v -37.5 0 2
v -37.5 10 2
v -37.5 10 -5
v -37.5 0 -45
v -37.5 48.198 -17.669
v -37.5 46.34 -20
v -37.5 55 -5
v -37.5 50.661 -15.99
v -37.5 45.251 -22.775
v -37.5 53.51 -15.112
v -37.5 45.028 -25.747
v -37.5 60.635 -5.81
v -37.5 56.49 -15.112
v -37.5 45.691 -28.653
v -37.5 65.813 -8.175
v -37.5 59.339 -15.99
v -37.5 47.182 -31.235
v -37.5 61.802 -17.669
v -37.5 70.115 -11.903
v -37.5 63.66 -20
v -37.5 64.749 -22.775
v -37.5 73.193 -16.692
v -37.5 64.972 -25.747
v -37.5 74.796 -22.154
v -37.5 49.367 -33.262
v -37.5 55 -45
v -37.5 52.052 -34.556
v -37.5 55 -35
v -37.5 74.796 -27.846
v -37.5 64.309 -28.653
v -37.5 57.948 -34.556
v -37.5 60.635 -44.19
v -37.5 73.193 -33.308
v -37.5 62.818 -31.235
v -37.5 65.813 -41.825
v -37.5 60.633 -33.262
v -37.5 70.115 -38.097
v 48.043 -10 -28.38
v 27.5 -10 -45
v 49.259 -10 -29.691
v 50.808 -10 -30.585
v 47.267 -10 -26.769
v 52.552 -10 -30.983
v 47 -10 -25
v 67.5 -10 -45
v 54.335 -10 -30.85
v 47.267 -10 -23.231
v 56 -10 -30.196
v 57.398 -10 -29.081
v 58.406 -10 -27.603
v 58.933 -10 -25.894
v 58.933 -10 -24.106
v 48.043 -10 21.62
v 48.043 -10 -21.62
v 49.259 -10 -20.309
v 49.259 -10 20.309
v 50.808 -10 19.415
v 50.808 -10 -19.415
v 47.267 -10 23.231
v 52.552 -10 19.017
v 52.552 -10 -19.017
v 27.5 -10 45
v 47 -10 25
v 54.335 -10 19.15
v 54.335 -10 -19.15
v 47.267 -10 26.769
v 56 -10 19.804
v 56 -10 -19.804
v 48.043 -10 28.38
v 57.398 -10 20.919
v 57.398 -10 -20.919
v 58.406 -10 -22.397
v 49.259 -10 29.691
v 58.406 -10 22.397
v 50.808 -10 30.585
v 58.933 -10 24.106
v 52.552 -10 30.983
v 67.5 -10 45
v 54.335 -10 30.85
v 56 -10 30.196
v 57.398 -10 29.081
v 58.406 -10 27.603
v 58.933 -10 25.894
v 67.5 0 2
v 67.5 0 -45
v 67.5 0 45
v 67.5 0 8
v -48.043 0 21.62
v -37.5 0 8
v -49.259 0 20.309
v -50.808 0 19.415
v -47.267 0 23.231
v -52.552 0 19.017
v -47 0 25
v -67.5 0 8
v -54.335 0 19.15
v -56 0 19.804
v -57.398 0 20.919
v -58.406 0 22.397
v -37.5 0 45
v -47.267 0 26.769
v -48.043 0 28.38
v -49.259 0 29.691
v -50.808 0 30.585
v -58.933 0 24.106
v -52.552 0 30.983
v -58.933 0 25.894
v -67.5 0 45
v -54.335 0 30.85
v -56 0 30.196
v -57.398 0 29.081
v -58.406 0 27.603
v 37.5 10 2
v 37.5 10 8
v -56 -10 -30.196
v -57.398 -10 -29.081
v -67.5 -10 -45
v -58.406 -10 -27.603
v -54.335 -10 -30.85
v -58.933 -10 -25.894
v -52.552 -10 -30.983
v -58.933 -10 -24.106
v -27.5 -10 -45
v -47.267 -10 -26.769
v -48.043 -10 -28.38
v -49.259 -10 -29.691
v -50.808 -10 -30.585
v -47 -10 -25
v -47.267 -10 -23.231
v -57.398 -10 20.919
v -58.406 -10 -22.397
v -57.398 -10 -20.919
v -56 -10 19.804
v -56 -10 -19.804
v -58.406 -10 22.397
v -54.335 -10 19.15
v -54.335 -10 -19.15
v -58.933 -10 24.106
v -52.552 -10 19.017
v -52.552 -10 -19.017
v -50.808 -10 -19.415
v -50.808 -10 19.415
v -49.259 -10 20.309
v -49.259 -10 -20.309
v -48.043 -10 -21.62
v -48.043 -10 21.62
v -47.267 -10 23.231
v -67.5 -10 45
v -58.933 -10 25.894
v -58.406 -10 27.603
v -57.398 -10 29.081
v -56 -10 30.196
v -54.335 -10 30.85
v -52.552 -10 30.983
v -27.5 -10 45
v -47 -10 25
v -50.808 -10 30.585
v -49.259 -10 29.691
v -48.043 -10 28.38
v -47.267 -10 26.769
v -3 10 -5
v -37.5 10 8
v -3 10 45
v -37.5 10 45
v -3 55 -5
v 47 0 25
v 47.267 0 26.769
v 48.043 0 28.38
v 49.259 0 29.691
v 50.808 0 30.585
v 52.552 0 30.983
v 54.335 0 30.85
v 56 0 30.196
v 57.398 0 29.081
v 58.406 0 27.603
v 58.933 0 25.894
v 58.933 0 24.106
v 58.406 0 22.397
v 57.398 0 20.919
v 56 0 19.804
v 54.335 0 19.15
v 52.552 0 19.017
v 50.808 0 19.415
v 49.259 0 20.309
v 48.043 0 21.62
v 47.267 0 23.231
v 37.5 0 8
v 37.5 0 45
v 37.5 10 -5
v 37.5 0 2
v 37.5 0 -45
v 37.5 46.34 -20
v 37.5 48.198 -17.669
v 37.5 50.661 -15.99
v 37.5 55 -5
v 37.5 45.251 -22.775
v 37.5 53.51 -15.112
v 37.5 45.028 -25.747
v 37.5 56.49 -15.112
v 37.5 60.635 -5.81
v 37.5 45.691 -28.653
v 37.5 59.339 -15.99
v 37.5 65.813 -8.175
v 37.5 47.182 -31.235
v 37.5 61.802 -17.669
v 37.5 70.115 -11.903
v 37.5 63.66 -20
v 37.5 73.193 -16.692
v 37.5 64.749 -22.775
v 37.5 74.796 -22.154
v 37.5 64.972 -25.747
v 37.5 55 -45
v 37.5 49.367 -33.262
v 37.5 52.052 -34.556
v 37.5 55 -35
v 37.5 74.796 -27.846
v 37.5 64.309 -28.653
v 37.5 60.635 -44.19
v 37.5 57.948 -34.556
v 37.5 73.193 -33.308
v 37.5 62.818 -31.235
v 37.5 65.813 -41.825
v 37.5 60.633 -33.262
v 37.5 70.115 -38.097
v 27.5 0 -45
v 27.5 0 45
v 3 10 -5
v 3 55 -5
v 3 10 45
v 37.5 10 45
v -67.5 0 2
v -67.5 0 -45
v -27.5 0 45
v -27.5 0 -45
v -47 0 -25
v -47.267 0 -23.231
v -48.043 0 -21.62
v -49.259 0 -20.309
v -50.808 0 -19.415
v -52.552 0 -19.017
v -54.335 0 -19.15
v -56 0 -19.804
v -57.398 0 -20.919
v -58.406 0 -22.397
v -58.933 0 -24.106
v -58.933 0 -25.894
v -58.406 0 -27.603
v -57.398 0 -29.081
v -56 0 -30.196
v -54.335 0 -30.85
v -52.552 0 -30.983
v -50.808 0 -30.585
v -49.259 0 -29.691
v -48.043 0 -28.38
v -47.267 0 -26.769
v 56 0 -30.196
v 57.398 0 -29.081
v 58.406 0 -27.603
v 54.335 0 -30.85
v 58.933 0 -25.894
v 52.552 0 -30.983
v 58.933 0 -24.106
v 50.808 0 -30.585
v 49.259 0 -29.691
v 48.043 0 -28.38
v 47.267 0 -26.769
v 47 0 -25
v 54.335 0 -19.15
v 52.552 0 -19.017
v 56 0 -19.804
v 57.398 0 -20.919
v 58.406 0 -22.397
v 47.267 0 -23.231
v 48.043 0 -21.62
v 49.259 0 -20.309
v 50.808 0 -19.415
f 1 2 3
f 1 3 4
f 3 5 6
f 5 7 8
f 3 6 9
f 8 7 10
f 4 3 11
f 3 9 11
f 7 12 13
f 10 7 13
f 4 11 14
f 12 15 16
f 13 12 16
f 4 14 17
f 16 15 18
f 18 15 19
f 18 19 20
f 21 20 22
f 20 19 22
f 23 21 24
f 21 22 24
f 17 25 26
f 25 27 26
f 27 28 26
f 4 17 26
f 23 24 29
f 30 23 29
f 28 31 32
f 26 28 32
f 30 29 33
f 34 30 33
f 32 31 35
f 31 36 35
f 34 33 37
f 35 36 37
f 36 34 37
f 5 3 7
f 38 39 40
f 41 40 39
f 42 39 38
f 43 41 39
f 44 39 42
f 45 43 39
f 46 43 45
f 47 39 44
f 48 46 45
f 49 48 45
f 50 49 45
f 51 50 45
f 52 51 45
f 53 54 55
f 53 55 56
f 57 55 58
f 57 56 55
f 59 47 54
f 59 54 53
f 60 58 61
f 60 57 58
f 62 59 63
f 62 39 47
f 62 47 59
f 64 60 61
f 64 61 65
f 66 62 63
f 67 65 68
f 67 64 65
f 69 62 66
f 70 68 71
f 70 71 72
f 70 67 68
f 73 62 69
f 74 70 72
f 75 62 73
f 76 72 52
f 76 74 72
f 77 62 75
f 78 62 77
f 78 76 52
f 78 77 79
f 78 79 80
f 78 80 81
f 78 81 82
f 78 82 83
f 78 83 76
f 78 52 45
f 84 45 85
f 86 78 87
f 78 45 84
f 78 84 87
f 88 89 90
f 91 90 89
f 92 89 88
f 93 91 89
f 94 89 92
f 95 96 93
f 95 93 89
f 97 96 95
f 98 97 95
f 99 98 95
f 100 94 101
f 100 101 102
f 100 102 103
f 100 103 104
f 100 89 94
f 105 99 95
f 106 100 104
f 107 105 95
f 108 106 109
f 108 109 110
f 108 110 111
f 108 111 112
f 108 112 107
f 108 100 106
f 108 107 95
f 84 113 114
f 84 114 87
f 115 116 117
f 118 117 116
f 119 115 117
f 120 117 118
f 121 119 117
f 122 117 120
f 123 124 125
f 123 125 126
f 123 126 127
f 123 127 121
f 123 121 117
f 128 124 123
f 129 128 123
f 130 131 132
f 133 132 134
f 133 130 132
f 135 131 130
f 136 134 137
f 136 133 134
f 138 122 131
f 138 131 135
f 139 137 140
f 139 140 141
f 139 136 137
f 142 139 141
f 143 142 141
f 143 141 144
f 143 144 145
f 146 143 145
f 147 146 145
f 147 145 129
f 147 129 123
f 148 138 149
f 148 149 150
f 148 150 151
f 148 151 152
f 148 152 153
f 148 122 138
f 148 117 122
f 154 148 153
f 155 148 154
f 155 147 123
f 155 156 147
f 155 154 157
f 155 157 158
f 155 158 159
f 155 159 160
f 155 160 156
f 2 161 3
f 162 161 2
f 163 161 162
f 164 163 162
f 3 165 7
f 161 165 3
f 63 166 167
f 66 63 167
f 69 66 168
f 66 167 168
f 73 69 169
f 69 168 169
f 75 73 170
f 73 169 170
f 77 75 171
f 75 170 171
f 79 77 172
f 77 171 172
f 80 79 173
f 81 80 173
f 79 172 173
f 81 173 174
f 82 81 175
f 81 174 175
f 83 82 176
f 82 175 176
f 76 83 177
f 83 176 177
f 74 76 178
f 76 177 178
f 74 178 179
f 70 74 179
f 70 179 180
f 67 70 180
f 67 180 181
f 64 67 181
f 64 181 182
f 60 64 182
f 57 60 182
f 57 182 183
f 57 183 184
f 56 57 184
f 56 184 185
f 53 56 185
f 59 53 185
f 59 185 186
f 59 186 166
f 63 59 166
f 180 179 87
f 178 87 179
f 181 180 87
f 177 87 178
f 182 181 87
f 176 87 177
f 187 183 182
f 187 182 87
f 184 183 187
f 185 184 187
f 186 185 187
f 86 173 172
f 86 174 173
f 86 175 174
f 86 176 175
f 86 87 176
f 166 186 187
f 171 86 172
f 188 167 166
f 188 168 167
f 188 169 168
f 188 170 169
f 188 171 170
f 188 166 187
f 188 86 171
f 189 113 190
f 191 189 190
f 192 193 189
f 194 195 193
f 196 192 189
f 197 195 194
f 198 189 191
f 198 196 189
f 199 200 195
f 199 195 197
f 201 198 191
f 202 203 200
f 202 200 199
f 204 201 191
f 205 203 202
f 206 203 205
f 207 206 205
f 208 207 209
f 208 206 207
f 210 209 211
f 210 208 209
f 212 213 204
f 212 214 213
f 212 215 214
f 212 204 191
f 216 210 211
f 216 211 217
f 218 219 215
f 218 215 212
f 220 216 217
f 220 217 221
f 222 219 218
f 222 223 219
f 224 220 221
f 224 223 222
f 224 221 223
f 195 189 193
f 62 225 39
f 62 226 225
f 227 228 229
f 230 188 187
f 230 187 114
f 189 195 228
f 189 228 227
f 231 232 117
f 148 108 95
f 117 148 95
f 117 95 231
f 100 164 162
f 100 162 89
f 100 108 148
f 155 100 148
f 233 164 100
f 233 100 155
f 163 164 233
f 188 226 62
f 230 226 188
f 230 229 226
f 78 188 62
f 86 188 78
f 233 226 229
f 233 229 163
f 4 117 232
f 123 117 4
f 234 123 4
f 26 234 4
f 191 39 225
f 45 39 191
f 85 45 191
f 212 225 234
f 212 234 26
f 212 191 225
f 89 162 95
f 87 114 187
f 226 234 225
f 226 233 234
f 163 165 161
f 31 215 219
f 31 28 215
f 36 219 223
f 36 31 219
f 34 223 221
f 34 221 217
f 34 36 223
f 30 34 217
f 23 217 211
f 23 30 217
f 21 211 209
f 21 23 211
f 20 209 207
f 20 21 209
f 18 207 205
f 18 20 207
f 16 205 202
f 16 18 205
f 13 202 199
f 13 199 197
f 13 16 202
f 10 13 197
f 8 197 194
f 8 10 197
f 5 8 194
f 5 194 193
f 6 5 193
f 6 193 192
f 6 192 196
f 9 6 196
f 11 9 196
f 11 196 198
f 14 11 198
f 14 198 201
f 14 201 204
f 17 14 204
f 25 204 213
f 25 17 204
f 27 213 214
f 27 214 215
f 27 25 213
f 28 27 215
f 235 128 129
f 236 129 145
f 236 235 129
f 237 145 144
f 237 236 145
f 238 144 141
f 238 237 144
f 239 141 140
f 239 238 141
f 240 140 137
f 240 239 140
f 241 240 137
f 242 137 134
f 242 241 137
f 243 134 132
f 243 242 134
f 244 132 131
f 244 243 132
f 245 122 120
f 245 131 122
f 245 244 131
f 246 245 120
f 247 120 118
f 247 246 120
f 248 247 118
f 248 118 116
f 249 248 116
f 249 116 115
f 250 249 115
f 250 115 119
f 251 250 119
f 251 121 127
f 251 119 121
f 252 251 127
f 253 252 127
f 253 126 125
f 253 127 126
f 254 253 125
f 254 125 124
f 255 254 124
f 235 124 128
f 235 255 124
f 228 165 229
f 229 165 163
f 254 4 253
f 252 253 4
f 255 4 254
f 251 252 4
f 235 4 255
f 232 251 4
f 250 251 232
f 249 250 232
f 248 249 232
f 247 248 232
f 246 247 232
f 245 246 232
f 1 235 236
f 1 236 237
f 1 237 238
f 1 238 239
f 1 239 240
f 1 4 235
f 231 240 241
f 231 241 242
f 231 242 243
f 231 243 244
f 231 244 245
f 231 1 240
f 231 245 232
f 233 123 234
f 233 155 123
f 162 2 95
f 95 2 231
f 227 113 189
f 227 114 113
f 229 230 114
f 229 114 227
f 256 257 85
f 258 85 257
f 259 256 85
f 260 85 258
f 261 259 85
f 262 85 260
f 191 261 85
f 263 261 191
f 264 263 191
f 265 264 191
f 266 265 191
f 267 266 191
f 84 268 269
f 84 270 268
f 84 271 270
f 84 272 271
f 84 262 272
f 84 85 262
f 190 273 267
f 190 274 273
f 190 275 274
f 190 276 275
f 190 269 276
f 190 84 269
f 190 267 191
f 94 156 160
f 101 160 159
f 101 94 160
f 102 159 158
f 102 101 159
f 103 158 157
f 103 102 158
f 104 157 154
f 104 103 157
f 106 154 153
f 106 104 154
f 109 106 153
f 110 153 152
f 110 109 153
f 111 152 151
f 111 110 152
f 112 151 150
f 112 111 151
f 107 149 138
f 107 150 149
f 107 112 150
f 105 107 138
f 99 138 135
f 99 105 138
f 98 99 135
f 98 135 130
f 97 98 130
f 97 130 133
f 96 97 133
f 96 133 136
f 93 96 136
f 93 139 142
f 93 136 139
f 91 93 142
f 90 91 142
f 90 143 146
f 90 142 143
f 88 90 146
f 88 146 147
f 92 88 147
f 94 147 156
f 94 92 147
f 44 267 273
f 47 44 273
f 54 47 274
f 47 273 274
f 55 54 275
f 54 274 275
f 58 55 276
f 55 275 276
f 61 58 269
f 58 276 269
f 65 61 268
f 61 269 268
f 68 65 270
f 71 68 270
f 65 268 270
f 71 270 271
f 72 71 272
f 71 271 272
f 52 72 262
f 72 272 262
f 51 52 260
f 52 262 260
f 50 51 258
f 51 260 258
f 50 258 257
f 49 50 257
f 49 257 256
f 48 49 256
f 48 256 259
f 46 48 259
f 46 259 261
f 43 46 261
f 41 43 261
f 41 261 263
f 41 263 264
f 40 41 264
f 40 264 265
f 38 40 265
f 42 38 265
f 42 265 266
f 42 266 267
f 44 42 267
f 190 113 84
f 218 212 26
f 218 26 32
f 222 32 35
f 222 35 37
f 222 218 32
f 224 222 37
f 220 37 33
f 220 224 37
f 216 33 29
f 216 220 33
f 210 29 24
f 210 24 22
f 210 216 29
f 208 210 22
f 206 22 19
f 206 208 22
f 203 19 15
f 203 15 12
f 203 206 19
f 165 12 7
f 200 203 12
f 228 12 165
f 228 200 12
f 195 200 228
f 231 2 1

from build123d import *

# Parameters (mm, degrees)
BOSS_EXTRUDE1_DEPTH = 45
RIB1_REACH          = 86.595
SKETCH3_WALL_W      = 202.812019758
SKETCH3_WALL_H      = 6
SKETCH5_R           = 6
CUT_EXTRUDE1_DEPTH  = 90
SKETCH6_R           = 6
CUT_EXTRUDE2_DEPTH  = 90
SKETCH7_R           = 10
BOSS_EXTRUDE2_DEPTH = 37.5
RIB2_REACH          = 112.482
SKETCH8_WALL_W      = 290.231918176
SKETCH8_WALL_H      = 6


with BuildPart() as part:
    # Sketch1 → Boss-Extrude1 (new, symmetric)
    with BuildSketch(Plane.XY):
        Polygon((0, 0), (27.5, 0), (27.5, -10), (67.5, -10), (67.5, 0), (37.5, 0), (37.5, 10), (-37.5, 10), (-37.5, 0), (-67.5, 0), (-67.5, -10), (-27.5, -10), (-27.5, 0), align=None)
    extrude(amount=BOSS_EXTRUDE1_DEPTH, both=True)

    # Sketch3 wall → Rib1 (add, up to next)
    with BuildSketch(Plane(origin=(52.5, 5, 5), x_dir=(0.948683298051, -0.316227766017, 0), z_dir=(0.316227766017, 0.948683298051, 0)), mode=Mode.PRIVATE) as rib1_sk1:
        Rectangle(SKETCH3_WALL_W, SKETCH3_WALL_H)
    rib1_tool1 = extrude(rib1_sk1.sketch, amount=-RIB1_REACH, mode=Mode.PRIVATE) - part.part
    rib1 = rib1_tool1.solids().sort_by_distance((52.5, 5, 5))[0]
    add(rib1)

    # Mirror1: Rib1 across plane
    add(rib1.mirror(Plane(origin=(0, 0, 0), x_dir=(0, 0, 1), z_dir=(1, 0, 0))))

    # Sketch5 → Cut-Extrude1 (cut)
    with BuildSketch(Plane(origin=(0, 0, 0), x_dir=(1, 0, 0), z_dir=(0, 1, 0))):
        with Locations(Location((53, -25, 0), (0, 0, 180))):
            Circle(SKETCH5_R)
    cut_extrude1 = extrude(amount=-CUT_EXTRUDE1_DEPTH, mode=Mode.SUBTRACT)

    # Mirror2: Cut-Extrude1 across plane
    add(cut_extrude1.mirror(Plane(origin=(0, 0, 0), x_dir=(0, 0, 1), z_dir=(1, 0, 0))), mode=Mode.SUBTRACT)

    # Sketch6 → Cut-Extrude2 (cut)
    with BuildSketch(Plane(origin=(0, 0, 0), x_dir=(1, 0, 0), z_dir=(0, 1, 0))):
        with Locations(Location((53, 25, 0), (0, 0, 180))):
            Circle(SKETCH6_R)
    cut_extrude2 = extrude(amount=-CUT_EXTRUDE2_DEPTH, mode=Mode.SUBTRACT)

    # Mirror3: Cut-Extrude2 across plane
    add(cut_extrude2.mirror(Plane(origin=(0, 0, 0), x_dir=(0, 0, 1), z_dir=(1, 0, 0))), mode=Mode.SUBTRACT)

    # Sketch7 → Boss-Extrude2 (add, symmetric)
    with BuildSketch(Plane(origin=(0, 0, 0), x_dir=(0, 0, -1), z_dir=(1, 0, 0))):
        with BuildLine():
            Line((5, 10), (45, 10))
            Line((45, 10), (45, 55))
            ThreePointArc((45, 55), (25, 75), (5, 55))
            Line((5, 55), (5, 10))
        make_face()
        with Locations((25, 55)):
            Circle(SKETCH7_R, mode=Mode.SUBTRACT)
    extrude(amount=BOSS_EXTRUDE2_DEPTH, both=True)

    # Sketch8 wall → Rib2 (add, up to next)
    with BuildSketch(Plane(origin=(0, 32.5, 20), x_dir=(0, -0.668964731622, 0.743294146247), z_dir=(0, -0.743294146247, -0.668964731622)), mode=Mode.PRIVATE) as rib2_sk1:
        Rectangle(SKETCH8_WALL_W, SKETCH8_WALL_H)
    rib2_tool1 = extrude(rib2_sk1.sketch, amount=RIB2_REACH, mode=Mode.PRIVATE) - part.part
    add(rib2_tool1.solids().sort_by_distance((0, 32.5, 20))[0])


solid = part.part
